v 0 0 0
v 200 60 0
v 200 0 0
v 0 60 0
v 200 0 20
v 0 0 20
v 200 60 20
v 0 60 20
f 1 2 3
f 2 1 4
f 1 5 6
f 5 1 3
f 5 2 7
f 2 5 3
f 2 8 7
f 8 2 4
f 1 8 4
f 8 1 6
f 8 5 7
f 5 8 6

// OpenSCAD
/*
  Locking Wedge — geometric baseline
  Batch 001

  Two identical wedges are used in opposite directions.
  The smooth mating faces remain in full contact throughout the overlap.
  Locking features are intentionally deferred until the base geometry is tested.
*/

// ---------- OpenSCAD Customizer ----------

part = "assembly"; // [assembly:Assembly,single_wedge:Single wedge,print_pair:Two-wedge print layout,range_preview:Low / nominal / high preview]

wedge_length = 200;       // [100:1:200]
wedge_width = 60;         // [20:1:180]
nominal_height = 20;      // [10:0.5:50]
total_height_range = 6;   // [2:0.5:20]

// -100 = low height, 0 = nominal height, +100 = high height.
assembly_position = 0;    // [-100:1:100]

// Visual separation only. Leave at 0 for the true assembly.
exploded_gap = 0;         // [0:0.5:20]

// Gap between identical wedges in the print layout.
print_gap = 5;            // [2:1:20]

// ---------- Derived dimensions ----------

thin_end = (nominal_height - total_height_range) / 2;
thick_end = (nominal_height + total_height_range) / 2;
wedge_taper = thick_end - thin_end;
wedge_slope = wedge_taper / wedge_length;
wedge_angle = atan(wedge_slope);
max_shift = wedge_length / 2;
assembly_shift = max_shift * assembly_position / 100;
assembled_height = nominal_height + assembly_shift * wedge_slope;
overlap_length = wedge_length - abs(assembly_shift);
footprint_length = wedge_length + abs(assembly_shift);
low_height = nominal_height - total_height_range / 2;
high_height = nominal_height + total_height_range / 2;

// ---------- Validation ----------

module validated_model() {
    assert(wedge_length > 0, "wedge_length must be greater than zero");
    assert(wedge_width > 0, "wedge_width must be greater than zero");
    assert(total_height_range > 0, "total_height_range must be greater than zero");
    assert(nominal_height > total_height_range,
        "nominal_height must be greater than total_height_range");
    assert(thin_end > 0, "The derived thin end must be greater than zero");
    assert(assembly_position >= -100 && assembly_position <= 100,
        "assembly_position must remain between -100 and +100");
    assert(overlap_length >= wedge_length / 2,
        "The configured travel must preserve at least half-length overlap");
    children();
}

// ---------- Geometry ----------

module wedge_body() {
    polyhedron(
        points = [
            [0,            0,           0],
            [wedge_length, 0,           0],
            [wedge_length, wedge_width, 0],
            [0,            wedge_width, 0],
            [0,            0,           thin_end],
            [wedge_length, 0,           thick_end],
            [wedge_length, wedge_width, thick_end],
            [0,            wedge_width, thin_end]
        ],
        faces = [
            [0, 3, 2, 1], // bottom
            [0, 1, 5, 4], // front
            [1, 2, 6, 5], // thick end
            [2, 3, 7, 6], // back
            [3, 0, 4, 7], // thin end
            [4, 5, 6, 7]  // sloped face
        ],
        convexity = 10
    );
}

module lower_wedge() {
    color([0.22, 0.45, 0.75])
        wedge_body();
}

module upper_wedge(position = assembly_position) {
    shift = max_shift * position / 100;
    height = nominal_height + shift * wedge_slope;

    color([0.72, 0.72, 0.75])
        translate([wedge_length + shift, 0, height + exploded_gap])
            rotate([0, 180, 0])
                wedge_body();
}

module wedge_assembly(position = assembly_position) {
    lower_wedge();
    upper_wedge(position);
}

module single_wedge() {
    wedge_body();
}

module print_pair() {
    wedge_body();
    translate([0, wedge_width + print_gap, 0])
        wedge_body();
}

module range_preview() {
    preview_spacing = wedge_length + max_shift + 30;

    translate([0, 0, 0])
        wedge_assembly(-100);

    translate([preview_spacing, 0, 0])
        wedge_assembly(0);

    translate([2 * preview_spacing, 0, 0])
        wedge_assembly(100);
}

module dispatch() {
    if (part == "assembly") {
        wedge_assembly();
    } else if (part == "single_wedge") {
        single_wedge();
    } else if (part == "print_pair") {
        print_pair();
    } else if (part == "range_preview") {
        range_preview();
    } else {
        assert(false, str("Unknown part selection: ", part));
    }
}

// ---------- Console report ----------

echo(str("Wedge length: ", wedge_length, " mm"));
echo(str("Wedge width: ", wedge_width, " mm"));
echo(str("Thin end: ", thin_end, " mm"));
echo(str("Thick end: ", thick_end, " mm"));
echo(str("Wedge angle: ", wedge_angle, " degrees"));
echo(str("Assembly shift: ", assembly_shift, " mm"));
echo(str("Assembled height: ", assembled_height, " mm"));
echo(str("Overlap length: ", overlap_length, " mm"));
echo(str("Overall footprint: ", footprint_length, " mm"));
echo(str("Height range: ", low_height, " to ", high_height, " mm"));

validated_model()
    dispatch();
